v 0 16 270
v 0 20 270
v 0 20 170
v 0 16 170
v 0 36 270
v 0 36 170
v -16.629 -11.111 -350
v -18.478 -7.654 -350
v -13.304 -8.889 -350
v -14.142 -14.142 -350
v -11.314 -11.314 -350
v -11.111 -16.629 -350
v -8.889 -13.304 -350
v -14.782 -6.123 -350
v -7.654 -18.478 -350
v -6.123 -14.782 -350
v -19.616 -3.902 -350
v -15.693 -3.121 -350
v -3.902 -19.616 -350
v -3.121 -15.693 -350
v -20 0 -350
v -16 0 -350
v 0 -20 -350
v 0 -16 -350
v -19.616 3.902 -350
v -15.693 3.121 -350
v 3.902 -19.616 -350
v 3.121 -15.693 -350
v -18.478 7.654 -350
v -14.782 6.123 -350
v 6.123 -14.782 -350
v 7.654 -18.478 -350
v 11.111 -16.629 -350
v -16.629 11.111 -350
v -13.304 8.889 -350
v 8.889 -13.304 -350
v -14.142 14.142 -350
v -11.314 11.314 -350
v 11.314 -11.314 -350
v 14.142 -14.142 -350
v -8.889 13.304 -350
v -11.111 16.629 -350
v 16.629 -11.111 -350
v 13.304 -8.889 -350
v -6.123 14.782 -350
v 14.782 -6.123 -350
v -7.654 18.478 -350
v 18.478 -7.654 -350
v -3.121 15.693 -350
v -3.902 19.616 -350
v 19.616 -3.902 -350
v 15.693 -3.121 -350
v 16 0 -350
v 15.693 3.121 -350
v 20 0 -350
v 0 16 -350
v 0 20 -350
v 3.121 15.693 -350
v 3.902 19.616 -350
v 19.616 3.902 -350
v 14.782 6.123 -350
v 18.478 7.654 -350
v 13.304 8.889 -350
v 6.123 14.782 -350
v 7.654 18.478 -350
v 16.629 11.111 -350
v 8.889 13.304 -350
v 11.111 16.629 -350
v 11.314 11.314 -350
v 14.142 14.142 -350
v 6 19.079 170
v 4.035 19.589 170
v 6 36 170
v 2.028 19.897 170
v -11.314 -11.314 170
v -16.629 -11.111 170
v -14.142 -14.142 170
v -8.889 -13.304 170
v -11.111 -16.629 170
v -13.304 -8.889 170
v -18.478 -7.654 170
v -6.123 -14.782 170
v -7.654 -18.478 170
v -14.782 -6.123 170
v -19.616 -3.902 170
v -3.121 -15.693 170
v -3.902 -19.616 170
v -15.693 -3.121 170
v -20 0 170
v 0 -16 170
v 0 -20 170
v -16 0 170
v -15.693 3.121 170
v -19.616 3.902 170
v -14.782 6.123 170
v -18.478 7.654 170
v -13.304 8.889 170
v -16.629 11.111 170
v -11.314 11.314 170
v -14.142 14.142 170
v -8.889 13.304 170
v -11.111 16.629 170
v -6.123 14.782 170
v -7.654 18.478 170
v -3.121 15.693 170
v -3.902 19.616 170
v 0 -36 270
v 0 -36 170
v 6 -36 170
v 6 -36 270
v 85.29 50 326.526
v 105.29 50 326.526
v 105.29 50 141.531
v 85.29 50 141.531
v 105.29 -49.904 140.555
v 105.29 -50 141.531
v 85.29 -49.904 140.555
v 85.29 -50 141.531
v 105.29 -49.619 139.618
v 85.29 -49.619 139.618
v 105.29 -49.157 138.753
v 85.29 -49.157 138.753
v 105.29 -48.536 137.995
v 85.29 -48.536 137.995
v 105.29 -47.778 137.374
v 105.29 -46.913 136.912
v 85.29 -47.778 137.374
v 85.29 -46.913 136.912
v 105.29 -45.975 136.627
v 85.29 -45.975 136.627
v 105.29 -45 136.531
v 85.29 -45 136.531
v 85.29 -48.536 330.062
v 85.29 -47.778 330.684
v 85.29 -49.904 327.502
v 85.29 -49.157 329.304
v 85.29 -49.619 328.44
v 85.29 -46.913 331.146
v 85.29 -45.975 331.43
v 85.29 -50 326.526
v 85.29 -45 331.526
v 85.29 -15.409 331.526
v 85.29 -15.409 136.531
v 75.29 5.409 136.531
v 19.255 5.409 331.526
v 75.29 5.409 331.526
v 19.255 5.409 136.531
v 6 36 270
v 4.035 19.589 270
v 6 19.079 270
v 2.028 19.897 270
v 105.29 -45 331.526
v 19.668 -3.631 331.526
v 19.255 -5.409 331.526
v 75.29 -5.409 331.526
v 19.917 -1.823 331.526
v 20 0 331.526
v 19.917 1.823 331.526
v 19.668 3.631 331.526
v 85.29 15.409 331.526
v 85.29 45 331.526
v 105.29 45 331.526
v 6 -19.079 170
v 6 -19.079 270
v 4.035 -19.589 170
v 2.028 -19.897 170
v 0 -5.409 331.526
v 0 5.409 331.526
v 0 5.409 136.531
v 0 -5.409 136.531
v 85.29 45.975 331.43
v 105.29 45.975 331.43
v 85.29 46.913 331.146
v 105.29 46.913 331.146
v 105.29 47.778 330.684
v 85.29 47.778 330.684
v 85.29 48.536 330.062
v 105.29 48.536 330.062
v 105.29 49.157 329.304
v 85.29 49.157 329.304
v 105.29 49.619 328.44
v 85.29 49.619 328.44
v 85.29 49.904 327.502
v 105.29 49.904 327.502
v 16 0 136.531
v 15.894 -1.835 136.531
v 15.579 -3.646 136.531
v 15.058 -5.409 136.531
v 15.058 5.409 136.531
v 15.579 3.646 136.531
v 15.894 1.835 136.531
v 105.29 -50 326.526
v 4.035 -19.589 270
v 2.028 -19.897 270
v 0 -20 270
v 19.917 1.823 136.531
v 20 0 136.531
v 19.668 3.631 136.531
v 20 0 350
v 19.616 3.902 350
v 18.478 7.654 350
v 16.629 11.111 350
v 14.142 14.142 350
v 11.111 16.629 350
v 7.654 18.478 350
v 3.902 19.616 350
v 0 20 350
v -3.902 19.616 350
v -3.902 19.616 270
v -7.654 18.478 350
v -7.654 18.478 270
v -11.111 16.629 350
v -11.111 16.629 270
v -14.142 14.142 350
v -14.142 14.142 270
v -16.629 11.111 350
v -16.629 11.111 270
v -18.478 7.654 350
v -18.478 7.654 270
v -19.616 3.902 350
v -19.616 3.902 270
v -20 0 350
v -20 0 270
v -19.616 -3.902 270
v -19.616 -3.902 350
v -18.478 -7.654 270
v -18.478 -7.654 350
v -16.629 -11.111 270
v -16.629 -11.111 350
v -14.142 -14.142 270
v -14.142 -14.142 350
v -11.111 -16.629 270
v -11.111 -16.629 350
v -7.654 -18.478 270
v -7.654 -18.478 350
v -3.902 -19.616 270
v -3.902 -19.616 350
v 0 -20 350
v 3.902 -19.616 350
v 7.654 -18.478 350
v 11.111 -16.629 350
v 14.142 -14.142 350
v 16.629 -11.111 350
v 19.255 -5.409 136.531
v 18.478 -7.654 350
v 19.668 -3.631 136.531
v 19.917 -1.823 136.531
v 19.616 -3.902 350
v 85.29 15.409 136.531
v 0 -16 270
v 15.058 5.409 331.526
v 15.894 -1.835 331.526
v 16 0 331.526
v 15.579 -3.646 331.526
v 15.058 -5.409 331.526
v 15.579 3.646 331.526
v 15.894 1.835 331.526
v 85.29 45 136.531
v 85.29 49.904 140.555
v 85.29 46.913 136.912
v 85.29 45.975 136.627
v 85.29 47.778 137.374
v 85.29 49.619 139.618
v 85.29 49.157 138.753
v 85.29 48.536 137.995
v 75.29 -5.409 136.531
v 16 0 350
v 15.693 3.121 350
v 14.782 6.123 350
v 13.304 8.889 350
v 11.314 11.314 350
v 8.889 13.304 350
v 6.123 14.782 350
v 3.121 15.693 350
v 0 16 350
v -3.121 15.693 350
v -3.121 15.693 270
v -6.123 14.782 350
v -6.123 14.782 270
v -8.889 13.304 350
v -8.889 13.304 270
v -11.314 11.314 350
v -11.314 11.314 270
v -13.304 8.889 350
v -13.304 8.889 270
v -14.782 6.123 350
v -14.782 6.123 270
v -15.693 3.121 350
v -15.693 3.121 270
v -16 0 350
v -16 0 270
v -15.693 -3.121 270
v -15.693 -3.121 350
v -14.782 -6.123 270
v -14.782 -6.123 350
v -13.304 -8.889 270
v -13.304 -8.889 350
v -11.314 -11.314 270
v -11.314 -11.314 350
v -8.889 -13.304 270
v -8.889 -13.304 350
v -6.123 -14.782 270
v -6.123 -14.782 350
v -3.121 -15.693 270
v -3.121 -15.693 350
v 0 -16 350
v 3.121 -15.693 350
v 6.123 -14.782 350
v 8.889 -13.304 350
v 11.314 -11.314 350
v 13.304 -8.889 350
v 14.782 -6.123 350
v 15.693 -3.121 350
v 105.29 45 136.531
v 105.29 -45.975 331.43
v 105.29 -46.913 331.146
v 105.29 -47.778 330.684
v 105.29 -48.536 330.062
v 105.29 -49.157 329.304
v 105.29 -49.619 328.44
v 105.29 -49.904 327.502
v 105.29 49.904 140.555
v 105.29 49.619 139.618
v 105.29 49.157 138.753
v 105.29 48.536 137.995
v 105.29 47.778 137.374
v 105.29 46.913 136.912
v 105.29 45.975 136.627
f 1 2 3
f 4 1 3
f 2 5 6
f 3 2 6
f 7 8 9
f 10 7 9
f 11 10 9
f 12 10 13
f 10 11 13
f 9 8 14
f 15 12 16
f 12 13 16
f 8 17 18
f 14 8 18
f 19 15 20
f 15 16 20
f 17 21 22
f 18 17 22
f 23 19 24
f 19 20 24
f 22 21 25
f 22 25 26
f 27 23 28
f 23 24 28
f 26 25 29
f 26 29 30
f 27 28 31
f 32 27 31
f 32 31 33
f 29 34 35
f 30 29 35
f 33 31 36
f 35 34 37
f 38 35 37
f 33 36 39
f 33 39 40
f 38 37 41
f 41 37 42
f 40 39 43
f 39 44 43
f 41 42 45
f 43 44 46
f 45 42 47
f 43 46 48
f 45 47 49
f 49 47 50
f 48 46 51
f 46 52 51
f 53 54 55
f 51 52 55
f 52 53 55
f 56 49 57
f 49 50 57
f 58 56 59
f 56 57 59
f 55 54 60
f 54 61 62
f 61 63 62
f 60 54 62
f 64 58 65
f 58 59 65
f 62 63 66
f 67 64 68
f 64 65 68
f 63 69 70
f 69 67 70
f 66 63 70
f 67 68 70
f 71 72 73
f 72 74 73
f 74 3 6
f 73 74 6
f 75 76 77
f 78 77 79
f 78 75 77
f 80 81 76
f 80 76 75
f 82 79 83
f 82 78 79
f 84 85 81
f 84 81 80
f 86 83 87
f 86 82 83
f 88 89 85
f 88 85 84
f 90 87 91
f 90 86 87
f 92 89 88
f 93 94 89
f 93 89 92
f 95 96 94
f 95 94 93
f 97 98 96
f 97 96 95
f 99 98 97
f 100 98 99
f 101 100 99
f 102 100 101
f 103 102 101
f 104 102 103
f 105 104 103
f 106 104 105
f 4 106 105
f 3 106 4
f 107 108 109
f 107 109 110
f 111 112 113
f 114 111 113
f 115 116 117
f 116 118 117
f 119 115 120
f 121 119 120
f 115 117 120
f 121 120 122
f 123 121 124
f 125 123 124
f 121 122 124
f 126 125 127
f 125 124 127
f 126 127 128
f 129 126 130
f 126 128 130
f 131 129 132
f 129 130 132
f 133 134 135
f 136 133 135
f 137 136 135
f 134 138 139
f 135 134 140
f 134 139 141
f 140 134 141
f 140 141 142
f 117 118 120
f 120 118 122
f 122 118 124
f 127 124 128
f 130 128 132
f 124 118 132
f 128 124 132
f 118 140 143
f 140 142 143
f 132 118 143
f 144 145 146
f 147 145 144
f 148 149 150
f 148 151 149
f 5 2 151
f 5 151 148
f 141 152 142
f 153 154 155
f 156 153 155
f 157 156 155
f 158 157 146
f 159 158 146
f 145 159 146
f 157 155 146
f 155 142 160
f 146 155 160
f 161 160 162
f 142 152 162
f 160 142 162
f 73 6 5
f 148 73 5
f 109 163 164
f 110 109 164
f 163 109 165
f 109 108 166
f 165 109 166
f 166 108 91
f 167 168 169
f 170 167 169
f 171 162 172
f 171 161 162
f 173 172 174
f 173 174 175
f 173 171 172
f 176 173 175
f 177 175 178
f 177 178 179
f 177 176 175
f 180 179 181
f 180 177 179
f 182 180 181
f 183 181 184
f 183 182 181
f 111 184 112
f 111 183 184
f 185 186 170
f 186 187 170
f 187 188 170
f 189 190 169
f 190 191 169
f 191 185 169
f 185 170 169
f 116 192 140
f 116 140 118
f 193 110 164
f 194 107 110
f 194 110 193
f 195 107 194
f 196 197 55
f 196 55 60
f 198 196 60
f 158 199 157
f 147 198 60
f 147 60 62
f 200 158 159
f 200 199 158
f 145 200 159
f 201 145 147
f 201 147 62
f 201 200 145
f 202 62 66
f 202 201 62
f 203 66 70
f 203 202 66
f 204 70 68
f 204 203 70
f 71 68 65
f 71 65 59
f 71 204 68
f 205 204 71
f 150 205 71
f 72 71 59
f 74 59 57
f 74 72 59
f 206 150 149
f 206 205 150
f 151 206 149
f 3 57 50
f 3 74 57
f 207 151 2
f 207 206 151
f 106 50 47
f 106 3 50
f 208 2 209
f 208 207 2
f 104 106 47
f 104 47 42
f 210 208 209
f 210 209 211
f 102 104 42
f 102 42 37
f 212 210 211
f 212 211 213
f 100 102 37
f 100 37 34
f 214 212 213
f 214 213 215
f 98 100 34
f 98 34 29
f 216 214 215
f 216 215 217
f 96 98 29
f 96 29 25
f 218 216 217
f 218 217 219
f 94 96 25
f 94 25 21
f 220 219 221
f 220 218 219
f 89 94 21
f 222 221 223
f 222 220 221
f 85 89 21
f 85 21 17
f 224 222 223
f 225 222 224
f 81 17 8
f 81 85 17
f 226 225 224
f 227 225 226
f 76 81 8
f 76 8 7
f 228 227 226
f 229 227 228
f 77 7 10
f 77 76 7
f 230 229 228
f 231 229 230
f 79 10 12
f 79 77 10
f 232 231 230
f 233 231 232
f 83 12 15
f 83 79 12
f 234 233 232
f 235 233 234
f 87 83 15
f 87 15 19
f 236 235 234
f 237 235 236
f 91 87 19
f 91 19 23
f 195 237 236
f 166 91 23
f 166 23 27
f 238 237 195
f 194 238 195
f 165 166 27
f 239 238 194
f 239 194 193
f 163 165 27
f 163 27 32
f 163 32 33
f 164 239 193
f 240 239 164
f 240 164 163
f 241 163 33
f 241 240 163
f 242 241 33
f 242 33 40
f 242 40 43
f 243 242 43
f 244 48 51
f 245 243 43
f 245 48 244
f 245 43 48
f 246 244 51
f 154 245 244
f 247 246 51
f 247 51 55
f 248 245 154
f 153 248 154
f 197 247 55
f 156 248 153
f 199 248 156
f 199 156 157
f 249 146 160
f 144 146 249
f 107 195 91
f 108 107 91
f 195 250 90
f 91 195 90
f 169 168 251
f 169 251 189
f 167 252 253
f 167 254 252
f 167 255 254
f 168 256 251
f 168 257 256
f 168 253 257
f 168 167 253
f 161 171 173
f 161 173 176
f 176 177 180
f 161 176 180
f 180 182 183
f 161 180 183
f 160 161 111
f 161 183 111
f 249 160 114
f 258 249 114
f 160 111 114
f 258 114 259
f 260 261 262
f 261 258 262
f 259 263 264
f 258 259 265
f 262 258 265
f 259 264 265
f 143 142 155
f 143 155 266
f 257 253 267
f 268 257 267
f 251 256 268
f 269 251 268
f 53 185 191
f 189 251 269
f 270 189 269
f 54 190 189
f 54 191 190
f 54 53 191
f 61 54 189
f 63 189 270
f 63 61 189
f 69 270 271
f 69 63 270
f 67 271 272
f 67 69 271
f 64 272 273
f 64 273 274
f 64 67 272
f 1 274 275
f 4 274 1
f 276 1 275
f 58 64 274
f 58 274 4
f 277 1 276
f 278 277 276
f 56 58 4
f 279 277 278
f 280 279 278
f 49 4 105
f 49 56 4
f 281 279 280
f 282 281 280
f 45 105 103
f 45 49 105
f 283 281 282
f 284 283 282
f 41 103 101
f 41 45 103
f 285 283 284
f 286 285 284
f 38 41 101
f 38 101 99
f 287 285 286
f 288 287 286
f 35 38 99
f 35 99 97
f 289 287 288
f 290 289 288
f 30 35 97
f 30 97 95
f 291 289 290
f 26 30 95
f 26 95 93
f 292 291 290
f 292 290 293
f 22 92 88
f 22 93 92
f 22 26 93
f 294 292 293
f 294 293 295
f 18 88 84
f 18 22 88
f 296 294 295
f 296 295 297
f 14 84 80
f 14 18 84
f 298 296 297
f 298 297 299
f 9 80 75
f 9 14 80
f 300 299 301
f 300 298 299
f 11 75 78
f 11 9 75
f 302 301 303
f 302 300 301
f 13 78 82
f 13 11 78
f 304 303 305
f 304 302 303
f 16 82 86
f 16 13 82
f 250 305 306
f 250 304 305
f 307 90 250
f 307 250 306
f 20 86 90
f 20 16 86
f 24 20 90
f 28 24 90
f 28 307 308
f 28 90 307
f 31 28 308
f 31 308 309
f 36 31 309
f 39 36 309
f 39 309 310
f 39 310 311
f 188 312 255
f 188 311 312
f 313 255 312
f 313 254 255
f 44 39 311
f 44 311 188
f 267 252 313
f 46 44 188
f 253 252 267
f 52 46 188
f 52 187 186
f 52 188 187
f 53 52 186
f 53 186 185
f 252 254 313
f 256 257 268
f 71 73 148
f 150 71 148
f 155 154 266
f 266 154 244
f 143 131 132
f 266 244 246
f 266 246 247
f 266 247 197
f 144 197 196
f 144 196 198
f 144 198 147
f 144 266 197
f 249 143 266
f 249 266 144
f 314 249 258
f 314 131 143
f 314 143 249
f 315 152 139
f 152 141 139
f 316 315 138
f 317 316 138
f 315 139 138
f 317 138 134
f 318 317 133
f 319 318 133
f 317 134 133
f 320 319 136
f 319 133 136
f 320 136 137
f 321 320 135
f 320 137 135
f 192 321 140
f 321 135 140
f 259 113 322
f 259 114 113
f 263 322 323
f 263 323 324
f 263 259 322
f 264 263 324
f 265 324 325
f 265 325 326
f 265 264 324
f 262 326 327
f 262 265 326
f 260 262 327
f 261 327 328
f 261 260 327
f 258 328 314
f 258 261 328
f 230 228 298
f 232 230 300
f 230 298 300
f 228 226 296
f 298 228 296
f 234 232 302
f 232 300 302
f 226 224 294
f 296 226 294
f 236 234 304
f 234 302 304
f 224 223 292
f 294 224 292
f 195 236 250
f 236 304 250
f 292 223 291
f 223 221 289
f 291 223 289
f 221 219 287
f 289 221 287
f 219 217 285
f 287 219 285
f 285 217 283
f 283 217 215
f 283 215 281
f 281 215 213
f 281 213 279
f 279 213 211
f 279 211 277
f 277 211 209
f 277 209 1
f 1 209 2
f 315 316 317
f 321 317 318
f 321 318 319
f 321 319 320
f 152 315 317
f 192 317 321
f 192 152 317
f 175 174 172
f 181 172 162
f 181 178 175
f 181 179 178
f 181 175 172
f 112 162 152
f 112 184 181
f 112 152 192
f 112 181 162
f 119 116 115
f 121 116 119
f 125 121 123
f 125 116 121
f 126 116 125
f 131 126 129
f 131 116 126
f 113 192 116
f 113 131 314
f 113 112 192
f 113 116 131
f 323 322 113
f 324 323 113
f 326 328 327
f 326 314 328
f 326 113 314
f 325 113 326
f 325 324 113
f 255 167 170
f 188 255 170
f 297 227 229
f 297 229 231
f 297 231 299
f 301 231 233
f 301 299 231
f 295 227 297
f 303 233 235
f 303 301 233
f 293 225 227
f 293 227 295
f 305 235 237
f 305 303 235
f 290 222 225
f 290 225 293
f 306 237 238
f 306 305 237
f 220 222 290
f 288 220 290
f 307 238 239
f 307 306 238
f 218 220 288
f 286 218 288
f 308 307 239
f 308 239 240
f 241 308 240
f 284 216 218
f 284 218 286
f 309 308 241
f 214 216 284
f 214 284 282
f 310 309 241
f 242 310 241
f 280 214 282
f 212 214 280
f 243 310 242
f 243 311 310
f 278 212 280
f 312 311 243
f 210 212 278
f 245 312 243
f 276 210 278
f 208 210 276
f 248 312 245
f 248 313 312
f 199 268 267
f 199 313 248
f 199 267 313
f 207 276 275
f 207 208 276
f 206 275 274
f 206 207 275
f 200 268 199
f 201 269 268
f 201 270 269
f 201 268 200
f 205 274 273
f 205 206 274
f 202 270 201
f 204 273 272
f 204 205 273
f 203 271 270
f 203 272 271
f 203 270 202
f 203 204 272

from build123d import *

# Parameters (mm, degrees)
SKETCH1_R           = 20
SKETCH1_R_2         = 16
BOSS_EXTRUDE1_DEPTH = 350
SKETCH2_W           = 46.702536181
SKETCH2_H           = 100
CUT_EXTRUDE1_DEPTH  = 100
SKETCH3_W           = 194.995303171
SKETCH3_H           = 10.817431772
BOSS_EXTRUDE2_DEPTH = 105.29
SKETCH4_W           = 194.995303171
SKETCH4_H           = 100
BOSS_EXTRUDE3_DEPTH = 20
CHAMFER1_SIZE       = 10
FILLET1_R           = 5
SKETCH5_W           = 100
SKETCH5_H           = 20
BOSS_EXTRUDE4_DEPTH = 6


with BuildPart() as part:
    # Sketch1 → Boss-Extrude1 (new, symmetric)
    with BuildSketch(Plane.XY):
        Circle(SKETCH1_R)
        Circle(SKETCH1_R_2, mode=Mode.SUBTRACT)
    extrude(amount=BOSS_EXTRUDE1_DEPTH, both=True)

    # Sketch2 → Cut-Extrude1 (cut, symmetric)
    with BuildSketch(Plane(origin=(0, 0, 0), x_dir=(1, 0, 0), z_dir=(0, 1, 0))):
        with Locations((-23.351268091, -220)):
            Rectangle(SKETCH2_W, SKETCH2_H)
    extrude(amount=CUT_EXTRUDE1_DEPTH, both=True, mode=Mode.SUBTRACT)

    # Sketch3 → Boss-Extrude2 (add)
    with BuildSketch(Plane(origin=(0, 0, 0), x_dir=(0, 0, -1), z_dir=(1, 0, 0))):
        with Locations((-234.028576152, 0)):
            Rectangle(SKETCH3_W, SKETCH3_H)
    extrude(amount=BOSS_EXTRUDE2_DEPTH)

    # Sketch4 → Boss-Extrude3 (add)
    with BuildSketch(Plane(origin=(105.29, 0, 0), x_dir=(0, 0, -1), z_dir=(1, 0, 0))):
        with Locations((-234.028576152, 0)):
            Rectangle(SKETCH4_W, SKETCH4_H)
    extrude(amount=-BOSS_EXTRUDE3_DEPTH)

    # Chamfer1
    chamfer1_edges = [part.edges().sort_by_distance(p)[0] for p in [
        (85.29, -5.408715886, 234.028576151),
        (85.29, 5.408715886, 234.028576151),
    ]]
    chamfer(chamfer1_edges, length=CHAMFER1_SIZE)

    # Fillet1
    fillet1_edges = [part.edges().sort_by_distance(p)[0] for p in [
        (95.29, 50, 136.530924566),
        (95.29, -50, 331.526227737),
        (95.29, -50, 136.530924566),
        (95.29, 50, 331.526227737),
    ]]
    fillet(fillet1_edges, radius=FILLET1_R)

    # Sketch5 → Boss-Extrude4 (add)
    with BuildSketch(Plane.ZY):
        with Locations((220, 26)):
            Rectangle(SKETCH5_W, SKETCH5_H)
        with Locations((220, -26)):
            Rectangle(SKETCH5_W, SKETCH5_H)
    extrude(amount=-BOSS_EXTRUDE4_DEPTH)


solid = part.part
